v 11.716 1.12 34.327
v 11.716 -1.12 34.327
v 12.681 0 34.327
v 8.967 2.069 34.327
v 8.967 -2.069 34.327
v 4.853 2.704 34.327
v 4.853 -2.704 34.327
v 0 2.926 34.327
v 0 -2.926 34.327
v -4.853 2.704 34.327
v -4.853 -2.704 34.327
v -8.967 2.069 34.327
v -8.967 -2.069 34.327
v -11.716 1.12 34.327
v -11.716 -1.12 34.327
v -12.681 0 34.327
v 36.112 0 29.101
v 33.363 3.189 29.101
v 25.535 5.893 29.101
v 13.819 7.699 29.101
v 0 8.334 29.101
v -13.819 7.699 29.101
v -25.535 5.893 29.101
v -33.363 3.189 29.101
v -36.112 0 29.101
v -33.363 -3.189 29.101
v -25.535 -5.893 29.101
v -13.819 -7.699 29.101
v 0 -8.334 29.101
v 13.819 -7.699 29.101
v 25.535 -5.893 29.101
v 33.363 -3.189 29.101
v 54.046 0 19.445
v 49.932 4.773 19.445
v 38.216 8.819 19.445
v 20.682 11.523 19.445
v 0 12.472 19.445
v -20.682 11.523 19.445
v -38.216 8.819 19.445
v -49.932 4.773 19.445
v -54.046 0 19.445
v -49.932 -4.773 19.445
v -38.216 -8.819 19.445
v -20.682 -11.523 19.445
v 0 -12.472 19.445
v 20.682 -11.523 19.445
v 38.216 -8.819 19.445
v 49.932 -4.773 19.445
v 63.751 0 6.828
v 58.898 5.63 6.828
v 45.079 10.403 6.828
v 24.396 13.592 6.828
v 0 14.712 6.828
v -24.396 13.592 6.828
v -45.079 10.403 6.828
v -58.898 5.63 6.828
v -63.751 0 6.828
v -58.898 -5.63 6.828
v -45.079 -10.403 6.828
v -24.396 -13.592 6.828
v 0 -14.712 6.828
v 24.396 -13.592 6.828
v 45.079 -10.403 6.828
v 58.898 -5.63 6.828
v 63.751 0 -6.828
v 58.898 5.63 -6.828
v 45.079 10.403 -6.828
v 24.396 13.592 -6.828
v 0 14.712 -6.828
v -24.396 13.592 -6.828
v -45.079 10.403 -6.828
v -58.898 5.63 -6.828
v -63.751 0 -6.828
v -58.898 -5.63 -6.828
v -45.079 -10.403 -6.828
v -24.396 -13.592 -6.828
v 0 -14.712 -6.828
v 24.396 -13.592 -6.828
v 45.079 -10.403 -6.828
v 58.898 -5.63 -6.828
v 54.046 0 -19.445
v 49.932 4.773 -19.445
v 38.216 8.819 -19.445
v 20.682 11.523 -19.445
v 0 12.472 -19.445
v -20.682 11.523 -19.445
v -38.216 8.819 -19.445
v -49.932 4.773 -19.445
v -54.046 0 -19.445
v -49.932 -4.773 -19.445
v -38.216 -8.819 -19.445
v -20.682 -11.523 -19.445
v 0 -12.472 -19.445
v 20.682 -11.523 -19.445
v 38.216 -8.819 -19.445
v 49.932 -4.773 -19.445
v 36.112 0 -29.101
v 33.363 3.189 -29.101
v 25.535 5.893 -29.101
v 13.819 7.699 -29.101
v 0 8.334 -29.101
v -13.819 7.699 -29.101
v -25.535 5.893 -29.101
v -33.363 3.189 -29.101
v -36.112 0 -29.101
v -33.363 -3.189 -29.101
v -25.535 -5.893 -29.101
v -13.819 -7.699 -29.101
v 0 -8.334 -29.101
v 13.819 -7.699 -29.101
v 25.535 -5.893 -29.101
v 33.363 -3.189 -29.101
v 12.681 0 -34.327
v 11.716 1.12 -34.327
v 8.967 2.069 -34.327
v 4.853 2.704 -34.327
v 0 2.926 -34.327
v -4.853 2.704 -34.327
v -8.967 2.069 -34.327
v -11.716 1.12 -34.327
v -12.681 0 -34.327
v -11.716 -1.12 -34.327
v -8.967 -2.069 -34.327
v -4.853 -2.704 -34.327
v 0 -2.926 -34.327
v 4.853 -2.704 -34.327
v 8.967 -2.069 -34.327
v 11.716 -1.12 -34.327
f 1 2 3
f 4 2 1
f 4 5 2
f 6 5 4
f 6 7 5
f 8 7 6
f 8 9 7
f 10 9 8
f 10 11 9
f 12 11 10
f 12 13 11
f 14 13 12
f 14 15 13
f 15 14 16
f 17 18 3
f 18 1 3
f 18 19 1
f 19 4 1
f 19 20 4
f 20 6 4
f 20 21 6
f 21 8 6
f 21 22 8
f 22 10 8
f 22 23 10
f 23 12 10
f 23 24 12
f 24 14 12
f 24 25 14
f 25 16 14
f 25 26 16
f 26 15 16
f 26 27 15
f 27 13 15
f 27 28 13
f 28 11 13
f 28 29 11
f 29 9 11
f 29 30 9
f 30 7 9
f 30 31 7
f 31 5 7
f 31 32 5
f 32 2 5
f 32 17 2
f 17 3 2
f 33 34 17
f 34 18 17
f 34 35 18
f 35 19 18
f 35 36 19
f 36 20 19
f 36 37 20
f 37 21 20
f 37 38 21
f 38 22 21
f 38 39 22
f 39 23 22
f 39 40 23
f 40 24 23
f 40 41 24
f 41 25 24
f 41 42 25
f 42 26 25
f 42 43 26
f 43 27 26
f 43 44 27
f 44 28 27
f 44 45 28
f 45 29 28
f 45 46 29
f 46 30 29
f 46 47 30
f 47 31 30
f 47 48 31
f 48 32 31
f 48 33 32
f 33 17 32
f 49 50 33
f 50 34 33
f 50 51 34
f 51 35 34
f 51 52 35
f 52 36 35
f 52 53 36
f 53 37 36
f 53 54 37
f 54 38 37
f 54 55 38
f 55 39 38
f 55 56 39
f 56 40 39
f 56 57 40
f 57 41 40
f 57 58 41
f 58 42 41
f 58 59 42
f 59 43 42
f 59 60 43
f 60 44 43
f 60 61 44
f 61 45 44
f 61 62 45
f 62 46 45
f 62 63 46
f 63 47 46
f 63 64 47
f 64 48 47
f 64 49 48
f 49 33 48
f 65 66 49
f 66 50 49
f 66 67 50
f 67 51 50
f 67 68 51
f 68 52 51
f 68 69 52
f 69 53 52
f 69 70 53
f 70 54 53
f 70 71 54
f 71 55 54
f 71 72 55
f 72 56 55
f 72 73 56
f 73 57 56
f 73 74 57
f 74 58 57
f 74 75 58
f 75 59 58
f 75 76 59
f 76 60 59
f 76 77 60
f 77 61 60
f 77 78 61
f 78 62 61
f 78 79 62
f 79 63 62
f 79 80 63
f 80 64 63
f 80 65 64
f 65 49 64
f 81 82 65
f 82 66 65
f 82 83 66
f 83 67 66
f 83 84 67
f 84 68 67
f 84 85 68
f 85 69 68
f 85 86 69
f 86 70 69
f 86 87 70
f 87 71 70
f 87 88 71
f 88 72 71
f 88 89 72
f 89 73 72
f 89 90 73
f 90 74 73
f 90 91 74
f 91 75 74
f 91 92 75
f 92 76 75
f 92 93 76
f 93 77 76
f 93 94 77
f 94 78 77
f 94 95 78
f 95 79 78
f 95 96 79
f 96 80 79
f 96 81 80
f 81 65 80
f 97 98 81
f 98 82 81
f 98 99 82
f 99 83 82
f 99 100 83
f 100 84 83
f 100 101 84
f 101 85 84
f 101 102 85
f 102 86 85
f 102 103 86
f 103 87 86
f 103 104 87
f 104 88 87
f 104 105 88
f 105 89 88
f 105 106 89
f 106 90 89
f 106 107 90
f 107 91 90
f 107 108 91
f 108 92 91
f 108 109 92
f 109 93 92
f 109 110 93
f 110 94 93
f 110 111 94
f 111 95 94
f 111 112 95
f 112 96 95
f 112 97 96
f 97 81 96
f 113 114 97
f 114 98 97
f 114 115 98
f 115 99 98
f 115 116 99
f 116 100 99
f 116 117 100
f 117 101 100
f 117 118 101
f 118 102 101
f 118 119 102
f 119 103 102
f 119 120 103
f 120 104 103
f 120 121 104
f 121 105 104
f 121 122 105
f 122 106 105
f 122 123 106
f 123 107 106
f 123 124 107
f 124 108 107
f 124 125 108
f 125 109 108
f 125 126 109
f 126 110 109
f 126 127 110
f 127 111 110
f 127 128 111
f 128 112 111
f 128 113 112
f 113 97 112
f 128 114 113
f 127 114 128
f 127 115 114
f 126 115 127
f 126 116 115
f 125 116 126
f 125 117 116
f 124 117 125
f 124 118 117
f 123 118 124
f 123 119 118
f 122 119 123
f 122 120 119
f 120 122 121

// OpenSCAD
// Generated by SolidPython 1.0.1 on 2020-07-29 00:46:50


scale(v = [13, 3, 7]) {
	sphere(r = 5);
}
/***********************************************
*********      SolidPython code:      **********
************************************************
 
# import packages: SolidPython
from solid import *
from solid.utils import *
from itertools import chain, combinations, permutations


class Resize:

    def __init__(self, scad_file):
        self.scad_file = scad_file
        #self.scad_file = import_scad(scad_file)
        # cone/cylinder param:
        self.r1 = 0
        self.r2 = 0
        self.h = 0
        # rectangular prism param:
        self.w = 0
        self.l = 0
        # ellipse param:
        self.r = 0

    # import OpenScad code (file name corresponds to shape)


    # classify shape + parameters
    def assign(self, param1, param2, param3):
        if self.scad_file == 'cone.scad':
            self.r1 = param1
            self.r2 = param2
            self.h = param3
        elif self.scad_file == 'cylinder.scad':
            self.r1 = param1
            self.r2 = param2
            self.h = param3
        elif self.scad_file == 'rectangularPrism.scad':
            self.h = param1
            self.l = param2
            self.w = param3
        else:
            self.r = param1
            self.h = param2

    # resize parameters
    def iterate(self):
        x = range(3, 20, 2)
        i = 1
        if self.scad_file == 'cone.scad':
            tempList = list(permutations(x, 2))
            for temp in tempList:
                param1 = temp[0]
                param2 = temp[1]
                filepath = 'produced_scad_files/' + 'cone' + str(param1) + '_' + str(param2) + '_' + '.scad'
                scad_render_to_file(cylinder(h=param1, r1=param2, r2=0), filepath)

        elif self.scad_file == 'cylinder.scad':
            tempList = list(permutations(x, 3))
            for temp in tempList:
                param1 = temp[0]
                param2 = temp[1]
                filepath = 'produced_scad_files/' + 'cylinder' + str(param1) + '_' + str(param2) + '_' + '.scad'
                scad_render_to_file(cylinder(h=param1, r1=param2, r2=param2), filepath)

        elif self.scad_file == 'rectangularPrism.scad':
            tempList = list(permutations(x, 3))
            for temp in tempList:
                param1 = temp[0]
                param2 = temp[1]
                param3 = temp[2]
                filepath = 'produced_scad_files/' + 'rectangularPrism' + str(param1) + '_' + str(param2) + '_' + str(
                    param3) + '.scad'
                scad_render_to_file(cube(size=(param1, param2, param3)), filepath)

        elif self.scad_file == 'ellipse.scad':
            tempList = list(permutations(x, 4))
            for temp in tempList:
                param1 = temp[0]
                param2 = temp[1]
                param3 = temp[2]
                param4 = temp[3]
                filepath = 'produced_scad_files/' + 'ellipse' + str(param1) + '_' + str(param2) + '_' + str(param3) + '_' + str(param4) + '.scad'
                scad_render_to_file(scale([param1, param2, param3])(sphere(r=param4)), filepath)

    def render_to_scadfile(self):
        scad_render_to_file(scad, 'example.scad') 
 
************************************************/
